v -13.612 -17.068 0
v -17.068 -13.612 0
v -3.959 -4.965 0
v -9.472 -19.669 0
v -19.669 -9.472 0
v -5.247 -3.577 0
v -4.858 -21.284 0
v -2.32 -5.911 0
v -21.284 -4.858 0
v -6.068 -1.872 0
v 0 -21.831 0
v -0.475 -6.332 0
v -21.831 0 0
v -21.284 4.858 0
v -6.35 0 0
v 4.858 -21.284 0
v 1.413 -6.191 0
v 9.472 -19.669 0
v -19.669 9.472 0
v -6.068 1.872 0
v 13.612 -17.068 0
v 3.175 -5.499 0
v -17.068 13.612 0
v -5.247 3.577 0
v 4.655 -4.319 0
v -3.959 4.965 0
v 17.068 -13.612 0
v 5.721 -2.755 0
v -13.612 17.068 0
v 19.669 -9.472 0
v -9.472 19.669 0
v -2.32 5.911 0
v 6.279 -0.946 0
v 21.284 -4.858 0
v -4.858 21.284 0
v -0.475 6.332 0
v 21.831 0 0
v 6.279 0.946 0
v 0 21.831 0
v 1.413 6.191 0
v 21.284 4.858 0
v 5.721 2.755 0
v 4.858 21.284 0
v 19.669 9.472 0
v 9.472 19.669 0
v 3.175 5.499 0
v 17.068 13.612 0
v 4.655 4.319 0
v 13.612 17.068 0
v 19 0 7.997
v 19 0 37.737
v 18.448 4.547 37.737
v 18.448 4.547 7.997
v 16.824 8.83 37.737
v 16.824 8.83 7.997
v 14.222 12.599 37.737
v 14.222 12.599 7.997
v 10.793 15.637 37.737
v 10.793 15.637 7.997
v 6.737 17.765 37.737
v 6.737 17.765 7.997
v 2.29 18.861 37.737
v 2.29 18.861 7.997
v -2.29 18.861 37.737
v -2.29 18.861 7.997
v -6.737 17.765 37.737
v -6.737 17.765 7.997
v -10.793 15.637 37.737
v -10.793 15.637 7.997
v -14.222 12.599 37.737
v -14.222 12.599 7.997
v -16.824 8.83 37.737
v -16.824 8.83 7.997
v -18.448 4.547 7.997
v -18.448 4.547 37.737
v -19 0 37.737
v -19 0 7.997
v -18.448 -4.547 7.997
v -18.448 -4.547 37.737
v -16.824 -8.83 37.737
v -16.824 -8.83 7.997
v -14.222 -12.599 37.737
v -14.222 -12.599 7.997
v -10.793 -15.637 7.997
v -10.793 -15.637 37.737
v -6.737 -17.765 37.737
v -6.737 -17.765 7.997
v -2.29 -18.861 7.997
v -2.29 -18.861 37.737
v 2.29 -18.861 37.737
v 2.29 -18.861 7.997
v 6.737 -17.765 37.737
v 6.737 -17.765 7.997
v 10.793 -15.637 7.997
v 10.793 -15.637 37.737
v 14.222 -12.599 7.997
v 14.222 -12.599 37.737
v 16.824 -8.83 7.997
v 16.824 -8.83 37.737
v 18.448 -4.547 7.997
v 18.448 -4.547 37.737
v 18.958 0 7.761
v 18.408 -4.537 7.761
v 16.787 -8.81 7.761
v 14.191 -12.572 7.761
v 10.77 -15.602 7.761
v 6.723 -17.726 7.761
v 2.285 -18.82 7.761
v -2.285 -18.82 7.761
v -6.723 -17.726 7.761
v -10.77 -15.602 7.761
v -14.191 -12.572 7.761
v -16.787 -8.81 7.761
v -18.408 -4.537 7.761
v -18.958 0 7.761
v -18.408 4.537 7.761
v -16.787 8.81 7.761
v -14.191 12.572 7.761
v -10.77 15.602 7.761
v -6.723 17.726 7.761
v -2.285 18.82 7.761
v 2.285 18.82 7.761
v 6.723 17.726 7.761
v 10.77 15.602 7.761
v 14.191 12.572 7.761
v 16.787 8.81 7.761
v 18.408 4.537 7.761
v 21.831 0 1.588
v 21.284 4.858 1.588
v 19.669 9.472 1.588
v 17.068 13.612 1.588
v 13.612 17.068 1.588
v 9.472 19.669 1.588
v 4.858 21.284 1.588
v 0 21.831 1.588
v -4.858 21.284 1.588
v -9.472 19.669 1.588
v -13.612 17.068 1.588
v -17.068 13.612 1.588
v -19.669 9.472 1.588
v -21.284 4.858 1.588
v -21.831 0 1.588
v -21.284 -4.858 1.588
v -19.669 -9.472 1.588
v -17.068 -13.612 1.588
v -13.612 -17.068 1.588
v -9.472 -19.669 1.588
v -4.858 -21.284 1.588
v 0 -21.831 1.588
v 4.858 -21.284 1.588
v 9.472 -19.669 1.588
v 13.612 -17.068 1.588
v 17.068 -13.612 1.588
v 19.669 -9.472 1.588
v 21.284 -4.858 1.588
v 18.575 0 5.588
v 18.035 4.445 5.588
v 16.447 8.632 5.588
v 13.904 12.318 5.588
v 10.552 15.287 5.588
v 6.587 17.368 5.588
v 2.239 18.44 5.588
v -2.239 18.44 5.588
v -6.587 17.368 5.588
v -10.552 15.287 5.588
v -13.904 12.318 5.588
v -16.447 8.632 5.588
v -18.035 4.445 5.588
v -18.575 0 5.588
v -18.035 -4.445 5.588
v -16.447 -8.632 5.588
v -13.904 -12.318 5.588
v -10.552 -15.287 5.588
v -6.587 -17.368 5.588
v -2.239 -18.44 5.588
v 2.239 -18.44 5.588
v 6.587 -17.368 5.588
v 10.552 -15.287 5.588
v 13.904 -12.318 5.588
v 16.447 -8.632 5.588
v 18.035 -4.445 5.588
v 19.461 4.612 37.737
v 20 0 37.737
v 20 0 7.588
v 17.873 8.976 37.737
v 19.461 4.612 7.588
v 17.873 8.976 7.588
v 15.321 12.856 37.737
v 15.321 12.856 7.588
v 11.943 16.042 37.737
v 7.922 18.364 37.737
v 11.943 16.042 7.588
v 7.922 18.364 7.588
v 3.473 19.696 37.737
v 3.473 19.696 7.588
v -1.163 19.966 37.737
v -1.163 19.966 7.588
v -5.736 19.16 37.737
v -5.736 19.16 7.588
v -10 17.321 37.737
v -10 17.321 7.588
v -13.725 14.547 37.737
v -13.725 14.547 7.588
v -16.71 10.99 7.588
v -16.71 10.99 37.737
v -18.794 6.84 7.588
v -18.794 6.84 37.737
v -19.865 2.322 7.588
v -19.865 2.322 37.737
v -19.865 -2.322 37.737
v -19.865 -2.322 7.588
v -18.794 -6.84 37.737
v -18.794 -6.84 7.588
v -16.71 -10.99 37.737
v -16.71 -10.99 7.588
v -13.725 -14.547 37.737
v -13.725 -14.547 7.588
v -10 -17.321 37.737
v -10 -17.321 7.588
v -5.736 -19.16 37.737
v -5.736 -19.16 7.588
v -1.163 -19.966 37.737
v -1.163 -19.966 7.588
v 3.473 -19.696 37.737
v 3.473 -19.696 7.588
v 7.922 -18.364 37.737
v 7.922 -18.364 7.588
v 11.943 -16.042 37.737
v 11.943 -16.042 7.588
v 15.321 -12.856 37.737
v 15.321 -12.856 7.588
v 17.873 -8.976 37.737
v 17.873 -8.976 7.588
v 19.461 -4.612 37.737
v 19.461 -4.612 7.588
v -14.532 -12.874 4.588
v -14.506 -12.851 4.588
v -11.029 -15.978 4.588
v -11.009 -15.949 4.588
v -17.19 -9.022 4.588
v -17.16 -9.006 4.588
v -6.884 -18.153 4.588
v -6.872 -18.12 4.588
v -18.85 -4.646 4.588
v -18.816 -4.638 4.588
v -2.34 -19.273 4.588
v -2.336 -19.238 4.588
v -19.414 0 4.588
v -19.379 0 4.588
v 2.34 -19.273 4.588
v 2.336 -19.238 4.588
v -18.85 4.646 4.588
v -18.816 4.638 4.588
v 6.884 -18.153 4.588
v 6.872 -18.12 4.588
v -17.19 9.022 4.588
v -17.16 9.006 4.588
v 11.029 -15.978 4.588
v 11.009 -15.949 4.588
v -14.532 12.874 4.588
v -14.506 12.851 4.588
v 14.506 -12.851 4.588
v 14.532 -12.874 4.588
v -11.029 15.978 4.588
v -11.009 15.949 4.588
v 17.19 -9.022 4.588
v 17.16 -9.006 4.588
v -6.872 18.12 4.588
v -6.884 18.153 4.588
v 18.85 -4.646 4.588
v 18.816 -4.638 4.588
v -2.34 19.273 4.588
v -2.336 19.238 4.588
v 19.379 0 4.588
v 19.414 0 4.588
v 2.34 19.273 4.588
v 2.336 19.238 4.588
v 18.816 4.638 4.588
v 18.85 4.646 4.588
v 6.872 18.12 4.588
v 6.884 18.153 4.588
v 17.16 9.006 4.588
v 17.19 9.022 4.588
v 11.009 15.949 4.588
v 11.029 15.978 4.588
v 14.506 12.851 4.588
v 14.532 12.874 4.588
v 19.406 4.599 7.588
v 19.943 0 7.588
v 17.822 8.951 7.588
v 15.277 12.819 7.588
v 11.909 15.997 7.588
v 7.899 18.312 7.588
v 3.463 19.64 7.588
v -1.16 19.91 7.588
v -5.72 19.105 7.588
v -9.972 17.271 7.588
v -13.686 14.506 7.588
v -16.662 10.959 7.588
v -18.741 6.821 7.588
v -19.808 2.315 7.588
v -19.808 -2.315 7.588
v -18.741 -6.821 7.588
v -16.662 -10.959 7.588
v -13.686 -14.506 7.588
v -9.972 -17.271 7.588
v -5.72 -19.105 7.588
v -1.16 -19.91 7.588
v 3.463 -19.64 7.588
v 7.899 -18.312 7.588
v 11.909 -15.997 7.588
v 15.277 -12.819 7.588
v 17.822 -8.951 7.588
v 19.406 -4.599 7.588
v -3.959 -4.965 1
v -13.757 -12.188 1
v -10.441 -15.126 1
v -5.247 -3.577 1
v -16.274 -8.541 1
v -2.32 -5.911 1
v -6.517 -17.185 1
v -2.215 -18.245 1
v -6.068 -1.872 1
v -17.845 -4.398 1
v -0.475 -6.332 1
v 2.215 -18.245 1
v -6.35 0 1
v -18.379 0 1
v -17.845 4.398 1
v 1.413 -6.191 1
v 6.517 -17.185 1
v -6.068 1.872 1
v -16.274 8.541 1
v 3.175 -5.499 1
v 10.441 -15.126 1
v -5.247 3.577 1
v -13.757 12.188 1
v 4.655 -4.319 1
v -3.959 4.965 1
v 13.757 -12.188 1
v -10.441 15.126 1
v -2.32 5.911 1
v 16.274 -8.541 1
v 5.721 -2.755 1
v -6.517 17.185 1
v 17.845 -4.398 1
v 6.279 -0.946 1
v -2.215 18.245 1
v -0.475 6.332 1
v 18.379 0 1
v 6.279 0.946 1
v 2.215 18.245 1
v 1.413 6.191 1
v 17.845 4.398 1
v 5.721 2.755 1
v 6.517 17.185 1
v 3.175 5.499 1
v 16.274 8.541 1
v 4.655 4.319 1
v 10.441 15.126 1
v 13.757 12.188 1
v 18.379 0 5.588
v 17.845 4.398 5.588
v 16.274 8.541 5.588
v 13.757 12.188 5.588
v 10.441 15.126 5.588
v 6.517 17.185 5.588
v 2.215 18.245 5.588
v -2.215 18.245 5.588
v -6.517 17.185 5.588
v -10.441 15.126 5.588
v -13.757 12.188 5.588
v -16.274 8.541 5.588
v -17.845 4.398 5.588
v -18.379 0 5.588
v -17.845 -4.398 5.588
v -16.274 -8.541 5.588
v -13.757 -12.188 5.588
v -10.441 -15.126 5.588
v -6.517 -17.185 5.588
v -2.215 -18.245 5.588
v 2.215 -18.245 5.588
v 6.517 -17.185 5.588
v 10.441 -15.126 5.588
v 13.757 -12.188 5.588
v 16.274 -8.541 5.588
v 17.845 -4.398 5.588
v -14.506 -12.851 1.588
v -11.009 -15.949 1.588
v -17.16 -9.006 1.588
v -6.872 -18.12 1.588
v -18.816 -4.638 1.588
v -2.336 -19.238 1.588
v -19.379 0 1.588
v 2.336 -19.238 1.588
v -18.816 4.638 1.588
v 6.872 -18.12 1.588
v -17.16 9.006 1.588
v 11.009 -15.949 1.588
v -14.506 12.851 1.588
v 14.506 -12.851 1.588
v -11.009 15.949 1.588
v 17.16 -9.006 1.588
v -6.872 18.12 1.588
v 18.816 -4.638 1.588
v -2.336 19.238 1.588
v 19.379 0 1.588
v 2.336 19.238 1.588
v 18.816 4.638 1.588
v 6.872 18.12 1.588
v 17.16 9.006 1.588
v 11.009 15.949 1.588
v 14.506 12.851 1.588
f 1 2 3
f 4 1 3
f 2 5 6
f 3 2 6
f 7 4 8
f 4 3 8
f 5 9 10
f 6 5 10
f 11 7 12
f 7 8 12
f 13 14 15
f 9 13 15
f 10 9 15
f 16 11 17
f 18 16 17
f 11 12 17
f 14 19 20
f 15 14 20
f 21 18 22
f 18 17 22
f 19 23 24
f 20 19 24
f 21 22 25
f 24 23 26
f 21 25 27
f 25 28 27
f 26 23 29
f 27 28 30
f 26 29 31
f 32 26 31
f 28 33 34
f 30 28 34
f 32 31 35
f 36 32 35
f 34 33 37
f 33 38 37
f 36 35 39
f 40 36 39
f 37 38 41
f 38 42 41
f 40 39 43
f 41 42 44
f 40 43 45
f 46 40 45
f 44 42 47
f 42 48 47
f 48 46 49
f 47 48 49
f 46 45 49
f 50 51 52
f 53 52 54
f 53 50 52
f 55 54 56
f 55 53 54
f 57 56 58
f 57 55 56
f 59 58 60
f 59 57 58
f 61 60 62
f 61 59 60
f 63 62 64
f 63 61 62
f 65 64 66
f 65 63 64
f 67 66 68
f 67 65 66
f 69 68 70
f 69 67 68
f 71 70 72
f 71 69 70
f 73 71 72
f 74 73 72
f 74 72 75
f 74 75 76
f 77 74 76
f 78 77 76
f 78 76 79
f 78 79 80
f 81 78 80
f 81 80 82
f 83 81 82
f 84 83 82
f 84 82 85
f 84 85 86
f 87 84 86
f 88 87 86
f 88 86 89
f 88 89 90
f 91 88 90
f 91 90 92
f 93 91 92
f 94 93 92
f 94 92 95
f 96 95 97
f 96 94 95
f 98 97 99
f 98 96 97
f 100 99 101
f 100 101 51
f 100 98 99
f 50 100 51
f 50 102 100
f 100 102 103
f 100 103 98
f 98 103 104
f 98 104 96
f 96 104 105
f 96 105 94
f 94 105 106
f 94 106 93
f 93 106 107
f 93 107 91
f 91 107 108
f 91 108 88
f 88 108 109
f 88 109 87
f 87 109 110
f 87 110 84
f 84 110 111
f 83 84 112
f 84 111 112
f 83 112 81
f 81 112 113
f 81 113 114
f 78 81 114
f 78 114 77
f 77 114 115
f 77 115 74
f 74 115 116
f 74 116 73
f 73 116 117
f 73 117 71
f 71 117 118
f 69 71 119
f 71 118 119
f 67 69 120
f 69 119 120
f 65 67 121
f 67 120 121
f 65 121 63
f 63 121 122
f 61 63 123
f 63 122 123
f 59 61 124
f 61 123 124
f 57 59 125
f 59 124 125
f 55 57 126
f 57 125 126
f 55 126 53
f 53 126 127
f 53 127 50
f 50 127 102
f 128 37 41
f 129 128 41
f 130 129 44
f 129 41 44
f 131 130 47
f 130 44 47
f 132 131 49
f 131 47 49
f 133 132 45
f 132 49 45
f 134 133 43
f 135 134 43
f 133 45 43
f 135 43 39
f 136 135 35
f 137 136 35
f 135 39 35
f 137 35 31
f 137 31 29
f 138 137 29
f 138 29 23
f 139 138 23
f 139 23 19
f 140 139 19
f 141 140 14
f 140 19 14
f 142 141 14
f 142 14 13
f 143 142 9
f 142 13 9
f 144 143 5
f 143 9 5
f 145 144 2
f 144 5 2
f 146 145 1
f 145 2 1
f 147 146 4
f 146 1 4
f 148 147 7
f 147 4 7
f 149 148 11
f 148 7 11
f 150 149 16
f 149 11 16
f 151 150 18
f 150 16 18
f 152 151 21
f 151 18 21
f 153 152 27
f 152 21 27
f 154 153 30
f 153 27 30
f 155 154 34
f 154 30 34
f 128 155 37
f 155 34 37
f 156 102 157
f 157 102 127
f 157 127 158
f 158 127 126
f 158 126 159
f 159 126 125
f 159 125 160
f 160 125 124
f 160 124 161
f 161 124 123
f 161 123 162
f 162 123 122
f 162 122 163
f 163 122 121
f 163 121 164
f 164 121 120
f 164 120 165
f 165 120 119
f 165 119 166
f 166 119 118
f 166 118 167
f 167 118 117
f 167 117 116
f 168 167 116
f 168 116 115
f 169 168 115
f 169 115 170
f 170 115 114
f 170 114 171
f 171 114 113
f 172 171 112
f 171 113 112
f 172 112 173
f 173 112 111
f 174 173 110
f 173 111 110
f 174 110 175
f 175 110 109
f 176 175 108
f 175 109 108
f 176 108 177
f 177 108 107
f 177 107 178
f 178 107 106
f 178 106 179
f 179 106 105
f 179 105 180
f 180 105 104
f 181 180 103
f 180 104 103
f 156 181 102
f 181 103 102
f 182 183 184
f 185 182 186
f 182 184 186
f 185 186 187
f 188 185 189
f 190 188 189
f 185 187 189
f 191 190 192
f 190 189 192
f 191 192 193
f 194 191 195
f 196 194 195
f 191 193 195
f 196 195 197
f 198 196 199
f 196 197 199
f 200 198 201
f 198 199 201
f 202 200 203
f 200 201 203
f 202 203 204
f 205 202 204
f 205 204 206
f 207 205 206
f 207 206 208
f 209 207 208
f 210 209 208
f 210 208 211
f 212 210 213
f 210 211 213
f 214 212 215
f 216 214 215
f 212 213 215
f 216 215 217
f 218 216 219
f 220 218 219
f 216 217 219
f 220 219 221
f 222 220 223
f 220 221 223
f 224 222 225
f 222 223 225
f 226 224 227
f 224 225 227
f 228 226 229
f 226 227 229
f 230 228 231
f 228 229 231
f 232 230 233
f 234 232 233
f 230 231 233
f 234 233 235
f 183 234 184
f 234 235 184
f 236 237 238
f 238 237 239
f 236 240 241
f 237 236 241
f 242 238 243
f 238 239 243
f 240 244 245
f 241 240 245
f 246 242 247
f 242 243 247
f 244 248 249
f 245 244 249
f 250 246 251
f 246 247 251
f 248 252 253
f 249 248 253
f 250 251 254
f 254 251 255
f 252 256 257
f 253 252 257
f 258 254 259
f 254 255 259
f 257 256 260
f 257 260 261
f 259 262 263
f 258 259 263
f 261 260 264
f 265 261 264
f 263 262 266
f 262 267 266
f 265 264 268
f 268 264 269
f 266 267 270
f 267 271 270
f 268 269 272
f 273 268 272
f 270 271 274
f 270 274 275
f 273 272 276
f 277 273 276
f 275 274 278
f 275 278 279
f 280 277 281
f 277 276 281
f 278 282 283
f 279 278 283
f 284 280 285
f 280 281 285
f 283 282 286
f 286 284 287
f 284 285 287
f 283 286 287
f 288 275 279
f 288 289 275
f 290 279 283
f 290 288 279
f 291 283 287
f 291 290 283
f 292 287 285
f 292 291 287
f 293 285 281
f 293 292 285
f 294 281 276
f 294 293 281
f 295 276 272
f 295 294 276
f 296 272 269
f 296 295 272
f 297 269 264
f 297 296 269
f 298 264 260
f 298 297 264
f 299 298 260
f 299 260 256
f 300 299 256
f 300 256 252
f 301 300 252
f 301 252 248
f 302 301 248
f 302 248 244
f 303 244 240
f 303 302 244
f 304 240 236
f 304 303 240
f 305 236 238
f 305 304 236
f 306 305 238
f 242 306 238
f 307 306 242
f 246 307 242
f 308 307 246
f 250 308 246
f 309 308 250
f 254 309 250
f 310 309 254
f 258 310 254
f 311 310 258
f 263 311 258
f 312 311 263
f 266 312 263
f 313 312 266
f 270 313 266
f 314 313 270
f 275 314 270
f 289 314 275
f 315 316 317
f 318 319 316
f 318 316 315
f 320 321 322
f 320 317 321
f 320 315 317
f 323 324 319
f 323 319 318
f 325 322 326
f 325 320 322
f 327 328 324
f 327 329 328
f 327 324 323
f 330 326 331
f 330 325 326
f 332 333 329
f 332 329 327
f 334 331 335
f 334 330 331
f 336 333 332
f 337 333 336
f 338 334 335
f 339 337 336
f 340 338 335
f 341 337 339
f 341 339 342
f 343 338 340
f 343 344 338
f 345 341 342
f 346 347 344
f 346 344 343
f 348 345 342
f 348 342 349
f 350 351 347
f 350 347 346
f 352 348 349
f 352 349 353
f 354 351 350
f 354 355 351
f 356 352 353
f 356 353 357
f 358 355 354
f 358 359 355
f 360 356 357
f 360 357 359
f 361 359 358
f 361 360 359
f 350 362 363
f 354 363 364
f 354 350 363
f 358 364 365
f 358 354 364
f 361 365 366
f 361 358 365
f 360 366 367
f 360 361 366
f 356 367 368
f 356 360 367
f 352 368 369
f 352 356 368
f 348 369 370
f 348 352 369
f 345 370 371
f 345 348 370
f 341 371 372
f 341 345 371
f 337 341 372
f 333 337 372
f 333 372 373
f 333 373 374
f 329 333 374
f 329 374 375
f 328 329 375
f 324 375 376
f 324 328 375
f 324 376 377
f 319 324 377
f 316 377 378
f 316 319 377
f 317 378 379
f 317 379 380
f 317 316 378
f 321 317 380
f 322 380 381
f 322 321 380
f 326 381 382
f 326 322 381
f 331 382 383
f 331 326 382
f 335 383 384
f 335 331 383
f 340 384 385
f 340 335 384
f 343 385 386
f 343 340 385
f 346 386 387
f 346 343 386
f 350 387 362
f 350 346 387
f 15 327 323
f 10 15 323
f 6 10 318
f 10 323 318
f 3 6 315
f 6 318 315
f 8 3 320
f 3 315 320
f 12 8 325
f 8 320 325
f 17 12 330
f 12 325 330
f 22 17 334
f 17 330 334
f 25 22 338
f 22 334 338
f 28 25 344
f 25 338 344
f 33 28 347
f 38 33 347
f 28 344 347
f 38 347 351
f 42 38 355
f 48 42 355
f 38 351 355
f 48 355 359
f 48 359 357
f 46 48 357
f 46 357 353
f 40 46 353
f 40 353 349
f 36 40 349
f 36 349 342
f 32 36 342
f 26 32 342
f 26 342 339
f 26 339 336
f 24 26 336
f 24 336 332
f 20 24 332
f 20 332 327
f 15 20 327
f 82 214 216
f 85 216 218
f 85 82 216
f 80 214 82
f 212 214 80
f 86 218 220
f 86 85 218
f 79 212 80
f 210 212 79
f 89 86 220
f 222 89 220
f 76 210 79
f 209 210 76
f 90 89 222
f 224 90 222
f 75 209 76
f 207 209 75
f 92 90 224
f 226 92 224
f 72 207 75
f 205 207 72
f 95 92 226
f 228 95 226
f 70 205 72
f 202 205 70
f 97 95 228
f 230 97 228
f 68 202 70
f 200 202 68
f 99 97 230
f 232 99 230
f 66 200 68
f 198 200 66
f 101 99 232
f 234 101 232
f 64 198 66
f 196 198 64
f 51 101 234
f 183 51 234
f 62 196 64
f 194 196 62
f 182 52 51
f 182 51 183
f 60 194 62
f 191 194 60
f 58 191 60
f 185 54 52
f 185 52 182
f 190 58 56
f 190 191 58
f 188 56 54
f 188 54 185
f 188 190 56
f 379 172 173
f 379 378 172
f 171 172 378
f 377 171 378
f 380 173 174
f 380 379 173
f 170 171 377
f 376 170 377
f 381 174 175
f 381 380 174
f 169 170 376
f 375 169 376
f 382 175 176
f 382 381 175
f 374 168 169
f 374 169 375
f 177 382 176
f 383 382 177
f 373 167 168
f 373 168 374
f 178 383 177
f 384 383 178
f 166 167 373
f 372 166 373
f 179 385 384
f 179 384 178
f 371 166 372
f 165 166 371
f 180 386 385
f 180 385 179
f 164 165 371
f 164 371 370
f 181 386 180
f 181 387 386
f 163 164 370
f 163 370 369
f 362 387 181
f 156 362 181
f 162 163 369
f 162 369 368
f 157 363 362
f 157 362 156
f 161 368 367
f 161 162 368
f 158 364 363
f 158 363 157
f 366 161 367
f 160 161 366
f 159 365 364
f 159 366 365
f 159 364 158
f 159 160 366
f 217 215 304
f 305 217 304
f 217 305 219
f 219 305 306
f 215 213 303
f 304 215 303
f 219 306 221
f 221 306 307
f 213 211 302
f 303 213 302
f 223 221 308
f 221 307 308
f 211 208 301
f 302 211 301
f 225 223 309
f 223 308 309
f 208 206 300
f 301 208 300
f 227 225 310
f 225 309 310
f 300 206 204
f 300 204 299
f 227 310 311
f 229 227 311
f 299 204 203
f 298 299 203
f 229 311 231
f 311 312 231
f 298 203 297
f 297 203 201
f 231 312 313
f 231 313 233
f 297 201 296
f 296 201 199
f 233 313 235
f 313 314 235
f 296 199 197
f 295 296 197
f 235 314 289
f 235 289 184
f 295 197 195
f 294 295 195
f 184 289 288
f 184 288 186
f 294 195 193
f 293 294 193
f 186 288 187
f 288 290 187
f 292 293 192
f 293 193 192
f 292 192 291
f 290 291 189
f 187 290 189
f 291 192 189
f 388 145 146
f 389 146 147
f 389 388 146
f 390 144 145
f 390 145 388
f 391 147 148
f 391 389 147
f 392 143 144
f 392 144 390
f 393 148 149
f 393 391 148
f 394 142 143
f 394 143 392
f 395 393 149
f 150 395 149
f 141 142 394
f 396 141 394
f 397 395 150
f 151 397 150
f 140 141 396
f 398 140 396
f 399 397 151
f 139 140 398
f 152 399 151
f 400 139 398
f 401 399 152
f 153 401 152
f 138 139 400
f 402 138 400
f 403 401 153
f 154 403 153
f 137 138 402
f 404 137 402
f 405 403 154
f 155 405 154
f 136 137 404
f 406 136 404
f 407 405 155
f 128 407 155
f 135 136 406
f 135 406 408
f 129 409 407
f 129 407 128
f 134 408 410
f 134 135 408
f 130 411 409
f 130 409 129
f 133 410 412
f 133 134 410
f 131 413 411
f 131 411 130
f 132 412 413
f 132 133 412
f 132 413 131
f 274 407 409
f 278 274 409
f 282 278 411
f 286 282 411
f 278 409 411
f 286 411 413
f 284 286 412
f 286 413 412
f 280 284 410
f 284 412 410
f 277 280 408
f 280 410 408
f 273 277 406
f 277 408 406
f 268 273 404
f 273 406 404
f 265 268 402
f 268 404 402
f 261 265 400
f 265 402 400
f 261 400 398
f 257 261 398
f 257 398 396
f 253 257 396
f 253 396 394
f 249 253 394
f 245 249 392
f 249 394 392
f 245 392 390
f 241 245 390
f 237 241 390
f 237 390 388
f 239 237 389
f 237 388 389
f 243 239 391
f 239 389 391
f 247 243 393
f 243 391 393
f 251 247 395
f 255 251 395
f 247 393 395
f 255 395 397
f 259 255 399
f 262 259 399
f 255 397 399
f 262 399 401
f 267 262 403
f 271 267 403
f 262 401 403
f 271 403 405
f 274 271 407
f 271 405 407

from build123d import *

# Parameters (mm, degrees)
F0_R     = 21.8313
F1_DEPTH = 1.5875
F2_R     = 19.3793862589
F3_DEPTH = 3
F4_R     = 19.4142729727
F5_DEPTH = 3
F5_TAPER = -10
F6_R     = 20
F7_DEPTH = 30.1498
F8_T     = 1
F10_D    = 12.7


# Not quite as in the source:
# - a length typed as a fraction of an inch, garbled in the dataset ("3 / 203.2 mm" for 3/8 in), is restored
# - a shell that OpenCascade refuses in one call is made with other operations: the cavity is built on its own and cut out


with BuildPart() as f1:
    # F0 (on Top) → F1 (new body)
    with BuildSketch(Plane.XY):
        Circle(F0_R)
    extrude(amount=F1_DEPTH)

    # F2 (on face) → F3 (join)
    with BuildSketch(Plane.XY.offset(1.5875)):
        Circle(F2_R)
    extrude(amount=F3_DEPTH)

    # F4 (on face) → F5 (join)
    with BuildSketch(Plane.XY.offset(4.5875)):
        Circle(F4_R)
    extrude(amount=F5_DEPTH, taper=F5_TAPER)

    # F6 (on face) → F7 (join)
    with BuildSketch(Plane.XY.offset(7.5875)):
        Circle(F6_R)
    extrude(amount=F7_DEPTH)

    # F8: shell of thickness 1, made by hand


with BuildPart() as f8_core1:
    # F8_t2: copy of F1
    add(f1.part)

    # the walls: a layer under each face that stays
    f8_faces = [f8_core1.faces().sort_by_distance(p)[0] for p in [
        (-20, 0, 22.6624),
        (17.5, -9.6296296296, 7.5875),
        (-19.6787634438, 0, 6.0875),
        (16.9874888511, -9.3476129128, 4.5875),
        (-19.3793862589, 0, 3.0875),
        (-14.5542, -14.5542, 1.5875),
        (-21.8313, 0, 0.79375),
        (0, 0, 0),
    ]]
    thicken(f8_faces, amount=-F8_T, mode=Mode.SUBTRACT)

    # F8_s3 → F8_t4 (revolve, cut)
    with BuildSketch(Plane.XZ):
        Polygon((19.9531019924, 7.5757635182), (19.9432539149, 8.5875), (19.1041542837, 8.5875), (18.9584461618, 7.7611481777), align=None)
    revolve(axis=Axis((0, 0, 7.5875), (0, 0, -1)), mode=Mode.SUBTRACT)

    # F8_s5 → F8_t6 (revolve, cut)
    with BuildSketch(Plane.XZ):
        Polygon((19.3893862589, 4.5775), (19.3793862589, 5.5875), (18.3793862589, 5.5875), (18.3793862589, 4.5875), align=None)
    revolve(axis=Axis((0, 0, 4.5875), (0, 0, 1)), mode=Mode.SUBTRACT)

    # F8_s7 → F8_t8 (revolve, cut)
    with BuildSketch(Plane.XZ):
        Polygon((19.3893862589, 1.5975), (18.3793862589, 1.5875), (18.3793862589, 0.5875), (19.3793862589, 0.5875), align=None)
    revolve(axis=Axis((0, 0, 1.5875), (0, 0, 1)), mode=Mode.SUBTRACT)


with BuildPart() as f1_1:
    add(f1.part)

    # what is left inside the walls is the cavity
    f8_cavity = [f8_core1.part.solids().sort_by_distance(p)[0] for p in [
        (-18.99, 0, 27.823804),
    ]]
    add(f8_cavity, mode=Mode.SUBTRACT)

    # F10 (through all)
    with Locations(Plane(origin=(0, 0, 0), x_dir=(1, 0, 0), z_dir=(0, 0, -1))):
        with Locations((0, 0)):
            Hole(F10_D / 2)


solid = f1_1.part
